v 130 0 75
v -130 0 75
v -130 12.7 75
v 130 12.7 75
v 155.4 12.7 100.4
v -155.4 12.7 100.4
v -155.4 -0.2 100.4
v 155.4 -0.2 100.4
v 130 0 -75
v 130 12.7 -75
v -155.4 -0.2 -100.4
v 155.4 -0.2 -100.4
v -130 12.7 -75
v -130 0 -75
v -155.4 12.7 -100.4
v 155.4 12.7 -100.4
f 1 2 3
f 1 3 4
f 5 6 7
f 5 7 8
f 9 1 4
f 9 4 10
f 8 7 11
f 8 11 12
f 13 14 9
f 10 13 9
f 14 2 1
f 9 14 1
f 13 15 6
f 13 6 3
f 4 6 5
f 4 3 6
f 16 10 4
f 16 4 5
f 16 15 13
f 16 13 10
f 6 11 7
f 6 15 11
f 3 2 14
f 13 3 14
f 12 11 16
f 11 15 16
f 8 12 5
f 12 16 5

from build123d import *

# Parameters (mm, degrees)
CROQUIS1_W              = 310.8
CROQUIS1_H              = 200.8
CROQUIS1_W_2            = 260
CROQUIS1_H_2            = 150
SALIENTE_EXTRUIR1_DEPTH = 12.7
CROQUIS2_W              = 310.8
CROQUIS2_H              = 200.8
SALIENTE_EXTRUIR2_DEPTH = 0.2


with BuildPart() as part:
    # Croquis1 → Saliente-Extruir1 (new body)
    with BuildSketch(Plane(origin=(0, 0, 0), x_dir=(1, 0, 0), z_dir=(0, 1, 0))):
        Rectangle(CROQUIS1_W, CROQUIS1_H)
        Rectangle(CROQUIS1_W_2, CROQUIS1_H_2, mode=Mode.SUBTRACT)
    extrude(amount=SALIENTE_EXTRUIR1_DEPTH)

    # Croquis2 → Saliente-Extruir2 (add)
    with BuildSketch(Plane.XZ):
        Rectangle(CROQUIS2_W, CROQUIS2_H)
    extrude(amount=SALIENTE_EXTRUIR2_DEPTH)


solid = part.part
